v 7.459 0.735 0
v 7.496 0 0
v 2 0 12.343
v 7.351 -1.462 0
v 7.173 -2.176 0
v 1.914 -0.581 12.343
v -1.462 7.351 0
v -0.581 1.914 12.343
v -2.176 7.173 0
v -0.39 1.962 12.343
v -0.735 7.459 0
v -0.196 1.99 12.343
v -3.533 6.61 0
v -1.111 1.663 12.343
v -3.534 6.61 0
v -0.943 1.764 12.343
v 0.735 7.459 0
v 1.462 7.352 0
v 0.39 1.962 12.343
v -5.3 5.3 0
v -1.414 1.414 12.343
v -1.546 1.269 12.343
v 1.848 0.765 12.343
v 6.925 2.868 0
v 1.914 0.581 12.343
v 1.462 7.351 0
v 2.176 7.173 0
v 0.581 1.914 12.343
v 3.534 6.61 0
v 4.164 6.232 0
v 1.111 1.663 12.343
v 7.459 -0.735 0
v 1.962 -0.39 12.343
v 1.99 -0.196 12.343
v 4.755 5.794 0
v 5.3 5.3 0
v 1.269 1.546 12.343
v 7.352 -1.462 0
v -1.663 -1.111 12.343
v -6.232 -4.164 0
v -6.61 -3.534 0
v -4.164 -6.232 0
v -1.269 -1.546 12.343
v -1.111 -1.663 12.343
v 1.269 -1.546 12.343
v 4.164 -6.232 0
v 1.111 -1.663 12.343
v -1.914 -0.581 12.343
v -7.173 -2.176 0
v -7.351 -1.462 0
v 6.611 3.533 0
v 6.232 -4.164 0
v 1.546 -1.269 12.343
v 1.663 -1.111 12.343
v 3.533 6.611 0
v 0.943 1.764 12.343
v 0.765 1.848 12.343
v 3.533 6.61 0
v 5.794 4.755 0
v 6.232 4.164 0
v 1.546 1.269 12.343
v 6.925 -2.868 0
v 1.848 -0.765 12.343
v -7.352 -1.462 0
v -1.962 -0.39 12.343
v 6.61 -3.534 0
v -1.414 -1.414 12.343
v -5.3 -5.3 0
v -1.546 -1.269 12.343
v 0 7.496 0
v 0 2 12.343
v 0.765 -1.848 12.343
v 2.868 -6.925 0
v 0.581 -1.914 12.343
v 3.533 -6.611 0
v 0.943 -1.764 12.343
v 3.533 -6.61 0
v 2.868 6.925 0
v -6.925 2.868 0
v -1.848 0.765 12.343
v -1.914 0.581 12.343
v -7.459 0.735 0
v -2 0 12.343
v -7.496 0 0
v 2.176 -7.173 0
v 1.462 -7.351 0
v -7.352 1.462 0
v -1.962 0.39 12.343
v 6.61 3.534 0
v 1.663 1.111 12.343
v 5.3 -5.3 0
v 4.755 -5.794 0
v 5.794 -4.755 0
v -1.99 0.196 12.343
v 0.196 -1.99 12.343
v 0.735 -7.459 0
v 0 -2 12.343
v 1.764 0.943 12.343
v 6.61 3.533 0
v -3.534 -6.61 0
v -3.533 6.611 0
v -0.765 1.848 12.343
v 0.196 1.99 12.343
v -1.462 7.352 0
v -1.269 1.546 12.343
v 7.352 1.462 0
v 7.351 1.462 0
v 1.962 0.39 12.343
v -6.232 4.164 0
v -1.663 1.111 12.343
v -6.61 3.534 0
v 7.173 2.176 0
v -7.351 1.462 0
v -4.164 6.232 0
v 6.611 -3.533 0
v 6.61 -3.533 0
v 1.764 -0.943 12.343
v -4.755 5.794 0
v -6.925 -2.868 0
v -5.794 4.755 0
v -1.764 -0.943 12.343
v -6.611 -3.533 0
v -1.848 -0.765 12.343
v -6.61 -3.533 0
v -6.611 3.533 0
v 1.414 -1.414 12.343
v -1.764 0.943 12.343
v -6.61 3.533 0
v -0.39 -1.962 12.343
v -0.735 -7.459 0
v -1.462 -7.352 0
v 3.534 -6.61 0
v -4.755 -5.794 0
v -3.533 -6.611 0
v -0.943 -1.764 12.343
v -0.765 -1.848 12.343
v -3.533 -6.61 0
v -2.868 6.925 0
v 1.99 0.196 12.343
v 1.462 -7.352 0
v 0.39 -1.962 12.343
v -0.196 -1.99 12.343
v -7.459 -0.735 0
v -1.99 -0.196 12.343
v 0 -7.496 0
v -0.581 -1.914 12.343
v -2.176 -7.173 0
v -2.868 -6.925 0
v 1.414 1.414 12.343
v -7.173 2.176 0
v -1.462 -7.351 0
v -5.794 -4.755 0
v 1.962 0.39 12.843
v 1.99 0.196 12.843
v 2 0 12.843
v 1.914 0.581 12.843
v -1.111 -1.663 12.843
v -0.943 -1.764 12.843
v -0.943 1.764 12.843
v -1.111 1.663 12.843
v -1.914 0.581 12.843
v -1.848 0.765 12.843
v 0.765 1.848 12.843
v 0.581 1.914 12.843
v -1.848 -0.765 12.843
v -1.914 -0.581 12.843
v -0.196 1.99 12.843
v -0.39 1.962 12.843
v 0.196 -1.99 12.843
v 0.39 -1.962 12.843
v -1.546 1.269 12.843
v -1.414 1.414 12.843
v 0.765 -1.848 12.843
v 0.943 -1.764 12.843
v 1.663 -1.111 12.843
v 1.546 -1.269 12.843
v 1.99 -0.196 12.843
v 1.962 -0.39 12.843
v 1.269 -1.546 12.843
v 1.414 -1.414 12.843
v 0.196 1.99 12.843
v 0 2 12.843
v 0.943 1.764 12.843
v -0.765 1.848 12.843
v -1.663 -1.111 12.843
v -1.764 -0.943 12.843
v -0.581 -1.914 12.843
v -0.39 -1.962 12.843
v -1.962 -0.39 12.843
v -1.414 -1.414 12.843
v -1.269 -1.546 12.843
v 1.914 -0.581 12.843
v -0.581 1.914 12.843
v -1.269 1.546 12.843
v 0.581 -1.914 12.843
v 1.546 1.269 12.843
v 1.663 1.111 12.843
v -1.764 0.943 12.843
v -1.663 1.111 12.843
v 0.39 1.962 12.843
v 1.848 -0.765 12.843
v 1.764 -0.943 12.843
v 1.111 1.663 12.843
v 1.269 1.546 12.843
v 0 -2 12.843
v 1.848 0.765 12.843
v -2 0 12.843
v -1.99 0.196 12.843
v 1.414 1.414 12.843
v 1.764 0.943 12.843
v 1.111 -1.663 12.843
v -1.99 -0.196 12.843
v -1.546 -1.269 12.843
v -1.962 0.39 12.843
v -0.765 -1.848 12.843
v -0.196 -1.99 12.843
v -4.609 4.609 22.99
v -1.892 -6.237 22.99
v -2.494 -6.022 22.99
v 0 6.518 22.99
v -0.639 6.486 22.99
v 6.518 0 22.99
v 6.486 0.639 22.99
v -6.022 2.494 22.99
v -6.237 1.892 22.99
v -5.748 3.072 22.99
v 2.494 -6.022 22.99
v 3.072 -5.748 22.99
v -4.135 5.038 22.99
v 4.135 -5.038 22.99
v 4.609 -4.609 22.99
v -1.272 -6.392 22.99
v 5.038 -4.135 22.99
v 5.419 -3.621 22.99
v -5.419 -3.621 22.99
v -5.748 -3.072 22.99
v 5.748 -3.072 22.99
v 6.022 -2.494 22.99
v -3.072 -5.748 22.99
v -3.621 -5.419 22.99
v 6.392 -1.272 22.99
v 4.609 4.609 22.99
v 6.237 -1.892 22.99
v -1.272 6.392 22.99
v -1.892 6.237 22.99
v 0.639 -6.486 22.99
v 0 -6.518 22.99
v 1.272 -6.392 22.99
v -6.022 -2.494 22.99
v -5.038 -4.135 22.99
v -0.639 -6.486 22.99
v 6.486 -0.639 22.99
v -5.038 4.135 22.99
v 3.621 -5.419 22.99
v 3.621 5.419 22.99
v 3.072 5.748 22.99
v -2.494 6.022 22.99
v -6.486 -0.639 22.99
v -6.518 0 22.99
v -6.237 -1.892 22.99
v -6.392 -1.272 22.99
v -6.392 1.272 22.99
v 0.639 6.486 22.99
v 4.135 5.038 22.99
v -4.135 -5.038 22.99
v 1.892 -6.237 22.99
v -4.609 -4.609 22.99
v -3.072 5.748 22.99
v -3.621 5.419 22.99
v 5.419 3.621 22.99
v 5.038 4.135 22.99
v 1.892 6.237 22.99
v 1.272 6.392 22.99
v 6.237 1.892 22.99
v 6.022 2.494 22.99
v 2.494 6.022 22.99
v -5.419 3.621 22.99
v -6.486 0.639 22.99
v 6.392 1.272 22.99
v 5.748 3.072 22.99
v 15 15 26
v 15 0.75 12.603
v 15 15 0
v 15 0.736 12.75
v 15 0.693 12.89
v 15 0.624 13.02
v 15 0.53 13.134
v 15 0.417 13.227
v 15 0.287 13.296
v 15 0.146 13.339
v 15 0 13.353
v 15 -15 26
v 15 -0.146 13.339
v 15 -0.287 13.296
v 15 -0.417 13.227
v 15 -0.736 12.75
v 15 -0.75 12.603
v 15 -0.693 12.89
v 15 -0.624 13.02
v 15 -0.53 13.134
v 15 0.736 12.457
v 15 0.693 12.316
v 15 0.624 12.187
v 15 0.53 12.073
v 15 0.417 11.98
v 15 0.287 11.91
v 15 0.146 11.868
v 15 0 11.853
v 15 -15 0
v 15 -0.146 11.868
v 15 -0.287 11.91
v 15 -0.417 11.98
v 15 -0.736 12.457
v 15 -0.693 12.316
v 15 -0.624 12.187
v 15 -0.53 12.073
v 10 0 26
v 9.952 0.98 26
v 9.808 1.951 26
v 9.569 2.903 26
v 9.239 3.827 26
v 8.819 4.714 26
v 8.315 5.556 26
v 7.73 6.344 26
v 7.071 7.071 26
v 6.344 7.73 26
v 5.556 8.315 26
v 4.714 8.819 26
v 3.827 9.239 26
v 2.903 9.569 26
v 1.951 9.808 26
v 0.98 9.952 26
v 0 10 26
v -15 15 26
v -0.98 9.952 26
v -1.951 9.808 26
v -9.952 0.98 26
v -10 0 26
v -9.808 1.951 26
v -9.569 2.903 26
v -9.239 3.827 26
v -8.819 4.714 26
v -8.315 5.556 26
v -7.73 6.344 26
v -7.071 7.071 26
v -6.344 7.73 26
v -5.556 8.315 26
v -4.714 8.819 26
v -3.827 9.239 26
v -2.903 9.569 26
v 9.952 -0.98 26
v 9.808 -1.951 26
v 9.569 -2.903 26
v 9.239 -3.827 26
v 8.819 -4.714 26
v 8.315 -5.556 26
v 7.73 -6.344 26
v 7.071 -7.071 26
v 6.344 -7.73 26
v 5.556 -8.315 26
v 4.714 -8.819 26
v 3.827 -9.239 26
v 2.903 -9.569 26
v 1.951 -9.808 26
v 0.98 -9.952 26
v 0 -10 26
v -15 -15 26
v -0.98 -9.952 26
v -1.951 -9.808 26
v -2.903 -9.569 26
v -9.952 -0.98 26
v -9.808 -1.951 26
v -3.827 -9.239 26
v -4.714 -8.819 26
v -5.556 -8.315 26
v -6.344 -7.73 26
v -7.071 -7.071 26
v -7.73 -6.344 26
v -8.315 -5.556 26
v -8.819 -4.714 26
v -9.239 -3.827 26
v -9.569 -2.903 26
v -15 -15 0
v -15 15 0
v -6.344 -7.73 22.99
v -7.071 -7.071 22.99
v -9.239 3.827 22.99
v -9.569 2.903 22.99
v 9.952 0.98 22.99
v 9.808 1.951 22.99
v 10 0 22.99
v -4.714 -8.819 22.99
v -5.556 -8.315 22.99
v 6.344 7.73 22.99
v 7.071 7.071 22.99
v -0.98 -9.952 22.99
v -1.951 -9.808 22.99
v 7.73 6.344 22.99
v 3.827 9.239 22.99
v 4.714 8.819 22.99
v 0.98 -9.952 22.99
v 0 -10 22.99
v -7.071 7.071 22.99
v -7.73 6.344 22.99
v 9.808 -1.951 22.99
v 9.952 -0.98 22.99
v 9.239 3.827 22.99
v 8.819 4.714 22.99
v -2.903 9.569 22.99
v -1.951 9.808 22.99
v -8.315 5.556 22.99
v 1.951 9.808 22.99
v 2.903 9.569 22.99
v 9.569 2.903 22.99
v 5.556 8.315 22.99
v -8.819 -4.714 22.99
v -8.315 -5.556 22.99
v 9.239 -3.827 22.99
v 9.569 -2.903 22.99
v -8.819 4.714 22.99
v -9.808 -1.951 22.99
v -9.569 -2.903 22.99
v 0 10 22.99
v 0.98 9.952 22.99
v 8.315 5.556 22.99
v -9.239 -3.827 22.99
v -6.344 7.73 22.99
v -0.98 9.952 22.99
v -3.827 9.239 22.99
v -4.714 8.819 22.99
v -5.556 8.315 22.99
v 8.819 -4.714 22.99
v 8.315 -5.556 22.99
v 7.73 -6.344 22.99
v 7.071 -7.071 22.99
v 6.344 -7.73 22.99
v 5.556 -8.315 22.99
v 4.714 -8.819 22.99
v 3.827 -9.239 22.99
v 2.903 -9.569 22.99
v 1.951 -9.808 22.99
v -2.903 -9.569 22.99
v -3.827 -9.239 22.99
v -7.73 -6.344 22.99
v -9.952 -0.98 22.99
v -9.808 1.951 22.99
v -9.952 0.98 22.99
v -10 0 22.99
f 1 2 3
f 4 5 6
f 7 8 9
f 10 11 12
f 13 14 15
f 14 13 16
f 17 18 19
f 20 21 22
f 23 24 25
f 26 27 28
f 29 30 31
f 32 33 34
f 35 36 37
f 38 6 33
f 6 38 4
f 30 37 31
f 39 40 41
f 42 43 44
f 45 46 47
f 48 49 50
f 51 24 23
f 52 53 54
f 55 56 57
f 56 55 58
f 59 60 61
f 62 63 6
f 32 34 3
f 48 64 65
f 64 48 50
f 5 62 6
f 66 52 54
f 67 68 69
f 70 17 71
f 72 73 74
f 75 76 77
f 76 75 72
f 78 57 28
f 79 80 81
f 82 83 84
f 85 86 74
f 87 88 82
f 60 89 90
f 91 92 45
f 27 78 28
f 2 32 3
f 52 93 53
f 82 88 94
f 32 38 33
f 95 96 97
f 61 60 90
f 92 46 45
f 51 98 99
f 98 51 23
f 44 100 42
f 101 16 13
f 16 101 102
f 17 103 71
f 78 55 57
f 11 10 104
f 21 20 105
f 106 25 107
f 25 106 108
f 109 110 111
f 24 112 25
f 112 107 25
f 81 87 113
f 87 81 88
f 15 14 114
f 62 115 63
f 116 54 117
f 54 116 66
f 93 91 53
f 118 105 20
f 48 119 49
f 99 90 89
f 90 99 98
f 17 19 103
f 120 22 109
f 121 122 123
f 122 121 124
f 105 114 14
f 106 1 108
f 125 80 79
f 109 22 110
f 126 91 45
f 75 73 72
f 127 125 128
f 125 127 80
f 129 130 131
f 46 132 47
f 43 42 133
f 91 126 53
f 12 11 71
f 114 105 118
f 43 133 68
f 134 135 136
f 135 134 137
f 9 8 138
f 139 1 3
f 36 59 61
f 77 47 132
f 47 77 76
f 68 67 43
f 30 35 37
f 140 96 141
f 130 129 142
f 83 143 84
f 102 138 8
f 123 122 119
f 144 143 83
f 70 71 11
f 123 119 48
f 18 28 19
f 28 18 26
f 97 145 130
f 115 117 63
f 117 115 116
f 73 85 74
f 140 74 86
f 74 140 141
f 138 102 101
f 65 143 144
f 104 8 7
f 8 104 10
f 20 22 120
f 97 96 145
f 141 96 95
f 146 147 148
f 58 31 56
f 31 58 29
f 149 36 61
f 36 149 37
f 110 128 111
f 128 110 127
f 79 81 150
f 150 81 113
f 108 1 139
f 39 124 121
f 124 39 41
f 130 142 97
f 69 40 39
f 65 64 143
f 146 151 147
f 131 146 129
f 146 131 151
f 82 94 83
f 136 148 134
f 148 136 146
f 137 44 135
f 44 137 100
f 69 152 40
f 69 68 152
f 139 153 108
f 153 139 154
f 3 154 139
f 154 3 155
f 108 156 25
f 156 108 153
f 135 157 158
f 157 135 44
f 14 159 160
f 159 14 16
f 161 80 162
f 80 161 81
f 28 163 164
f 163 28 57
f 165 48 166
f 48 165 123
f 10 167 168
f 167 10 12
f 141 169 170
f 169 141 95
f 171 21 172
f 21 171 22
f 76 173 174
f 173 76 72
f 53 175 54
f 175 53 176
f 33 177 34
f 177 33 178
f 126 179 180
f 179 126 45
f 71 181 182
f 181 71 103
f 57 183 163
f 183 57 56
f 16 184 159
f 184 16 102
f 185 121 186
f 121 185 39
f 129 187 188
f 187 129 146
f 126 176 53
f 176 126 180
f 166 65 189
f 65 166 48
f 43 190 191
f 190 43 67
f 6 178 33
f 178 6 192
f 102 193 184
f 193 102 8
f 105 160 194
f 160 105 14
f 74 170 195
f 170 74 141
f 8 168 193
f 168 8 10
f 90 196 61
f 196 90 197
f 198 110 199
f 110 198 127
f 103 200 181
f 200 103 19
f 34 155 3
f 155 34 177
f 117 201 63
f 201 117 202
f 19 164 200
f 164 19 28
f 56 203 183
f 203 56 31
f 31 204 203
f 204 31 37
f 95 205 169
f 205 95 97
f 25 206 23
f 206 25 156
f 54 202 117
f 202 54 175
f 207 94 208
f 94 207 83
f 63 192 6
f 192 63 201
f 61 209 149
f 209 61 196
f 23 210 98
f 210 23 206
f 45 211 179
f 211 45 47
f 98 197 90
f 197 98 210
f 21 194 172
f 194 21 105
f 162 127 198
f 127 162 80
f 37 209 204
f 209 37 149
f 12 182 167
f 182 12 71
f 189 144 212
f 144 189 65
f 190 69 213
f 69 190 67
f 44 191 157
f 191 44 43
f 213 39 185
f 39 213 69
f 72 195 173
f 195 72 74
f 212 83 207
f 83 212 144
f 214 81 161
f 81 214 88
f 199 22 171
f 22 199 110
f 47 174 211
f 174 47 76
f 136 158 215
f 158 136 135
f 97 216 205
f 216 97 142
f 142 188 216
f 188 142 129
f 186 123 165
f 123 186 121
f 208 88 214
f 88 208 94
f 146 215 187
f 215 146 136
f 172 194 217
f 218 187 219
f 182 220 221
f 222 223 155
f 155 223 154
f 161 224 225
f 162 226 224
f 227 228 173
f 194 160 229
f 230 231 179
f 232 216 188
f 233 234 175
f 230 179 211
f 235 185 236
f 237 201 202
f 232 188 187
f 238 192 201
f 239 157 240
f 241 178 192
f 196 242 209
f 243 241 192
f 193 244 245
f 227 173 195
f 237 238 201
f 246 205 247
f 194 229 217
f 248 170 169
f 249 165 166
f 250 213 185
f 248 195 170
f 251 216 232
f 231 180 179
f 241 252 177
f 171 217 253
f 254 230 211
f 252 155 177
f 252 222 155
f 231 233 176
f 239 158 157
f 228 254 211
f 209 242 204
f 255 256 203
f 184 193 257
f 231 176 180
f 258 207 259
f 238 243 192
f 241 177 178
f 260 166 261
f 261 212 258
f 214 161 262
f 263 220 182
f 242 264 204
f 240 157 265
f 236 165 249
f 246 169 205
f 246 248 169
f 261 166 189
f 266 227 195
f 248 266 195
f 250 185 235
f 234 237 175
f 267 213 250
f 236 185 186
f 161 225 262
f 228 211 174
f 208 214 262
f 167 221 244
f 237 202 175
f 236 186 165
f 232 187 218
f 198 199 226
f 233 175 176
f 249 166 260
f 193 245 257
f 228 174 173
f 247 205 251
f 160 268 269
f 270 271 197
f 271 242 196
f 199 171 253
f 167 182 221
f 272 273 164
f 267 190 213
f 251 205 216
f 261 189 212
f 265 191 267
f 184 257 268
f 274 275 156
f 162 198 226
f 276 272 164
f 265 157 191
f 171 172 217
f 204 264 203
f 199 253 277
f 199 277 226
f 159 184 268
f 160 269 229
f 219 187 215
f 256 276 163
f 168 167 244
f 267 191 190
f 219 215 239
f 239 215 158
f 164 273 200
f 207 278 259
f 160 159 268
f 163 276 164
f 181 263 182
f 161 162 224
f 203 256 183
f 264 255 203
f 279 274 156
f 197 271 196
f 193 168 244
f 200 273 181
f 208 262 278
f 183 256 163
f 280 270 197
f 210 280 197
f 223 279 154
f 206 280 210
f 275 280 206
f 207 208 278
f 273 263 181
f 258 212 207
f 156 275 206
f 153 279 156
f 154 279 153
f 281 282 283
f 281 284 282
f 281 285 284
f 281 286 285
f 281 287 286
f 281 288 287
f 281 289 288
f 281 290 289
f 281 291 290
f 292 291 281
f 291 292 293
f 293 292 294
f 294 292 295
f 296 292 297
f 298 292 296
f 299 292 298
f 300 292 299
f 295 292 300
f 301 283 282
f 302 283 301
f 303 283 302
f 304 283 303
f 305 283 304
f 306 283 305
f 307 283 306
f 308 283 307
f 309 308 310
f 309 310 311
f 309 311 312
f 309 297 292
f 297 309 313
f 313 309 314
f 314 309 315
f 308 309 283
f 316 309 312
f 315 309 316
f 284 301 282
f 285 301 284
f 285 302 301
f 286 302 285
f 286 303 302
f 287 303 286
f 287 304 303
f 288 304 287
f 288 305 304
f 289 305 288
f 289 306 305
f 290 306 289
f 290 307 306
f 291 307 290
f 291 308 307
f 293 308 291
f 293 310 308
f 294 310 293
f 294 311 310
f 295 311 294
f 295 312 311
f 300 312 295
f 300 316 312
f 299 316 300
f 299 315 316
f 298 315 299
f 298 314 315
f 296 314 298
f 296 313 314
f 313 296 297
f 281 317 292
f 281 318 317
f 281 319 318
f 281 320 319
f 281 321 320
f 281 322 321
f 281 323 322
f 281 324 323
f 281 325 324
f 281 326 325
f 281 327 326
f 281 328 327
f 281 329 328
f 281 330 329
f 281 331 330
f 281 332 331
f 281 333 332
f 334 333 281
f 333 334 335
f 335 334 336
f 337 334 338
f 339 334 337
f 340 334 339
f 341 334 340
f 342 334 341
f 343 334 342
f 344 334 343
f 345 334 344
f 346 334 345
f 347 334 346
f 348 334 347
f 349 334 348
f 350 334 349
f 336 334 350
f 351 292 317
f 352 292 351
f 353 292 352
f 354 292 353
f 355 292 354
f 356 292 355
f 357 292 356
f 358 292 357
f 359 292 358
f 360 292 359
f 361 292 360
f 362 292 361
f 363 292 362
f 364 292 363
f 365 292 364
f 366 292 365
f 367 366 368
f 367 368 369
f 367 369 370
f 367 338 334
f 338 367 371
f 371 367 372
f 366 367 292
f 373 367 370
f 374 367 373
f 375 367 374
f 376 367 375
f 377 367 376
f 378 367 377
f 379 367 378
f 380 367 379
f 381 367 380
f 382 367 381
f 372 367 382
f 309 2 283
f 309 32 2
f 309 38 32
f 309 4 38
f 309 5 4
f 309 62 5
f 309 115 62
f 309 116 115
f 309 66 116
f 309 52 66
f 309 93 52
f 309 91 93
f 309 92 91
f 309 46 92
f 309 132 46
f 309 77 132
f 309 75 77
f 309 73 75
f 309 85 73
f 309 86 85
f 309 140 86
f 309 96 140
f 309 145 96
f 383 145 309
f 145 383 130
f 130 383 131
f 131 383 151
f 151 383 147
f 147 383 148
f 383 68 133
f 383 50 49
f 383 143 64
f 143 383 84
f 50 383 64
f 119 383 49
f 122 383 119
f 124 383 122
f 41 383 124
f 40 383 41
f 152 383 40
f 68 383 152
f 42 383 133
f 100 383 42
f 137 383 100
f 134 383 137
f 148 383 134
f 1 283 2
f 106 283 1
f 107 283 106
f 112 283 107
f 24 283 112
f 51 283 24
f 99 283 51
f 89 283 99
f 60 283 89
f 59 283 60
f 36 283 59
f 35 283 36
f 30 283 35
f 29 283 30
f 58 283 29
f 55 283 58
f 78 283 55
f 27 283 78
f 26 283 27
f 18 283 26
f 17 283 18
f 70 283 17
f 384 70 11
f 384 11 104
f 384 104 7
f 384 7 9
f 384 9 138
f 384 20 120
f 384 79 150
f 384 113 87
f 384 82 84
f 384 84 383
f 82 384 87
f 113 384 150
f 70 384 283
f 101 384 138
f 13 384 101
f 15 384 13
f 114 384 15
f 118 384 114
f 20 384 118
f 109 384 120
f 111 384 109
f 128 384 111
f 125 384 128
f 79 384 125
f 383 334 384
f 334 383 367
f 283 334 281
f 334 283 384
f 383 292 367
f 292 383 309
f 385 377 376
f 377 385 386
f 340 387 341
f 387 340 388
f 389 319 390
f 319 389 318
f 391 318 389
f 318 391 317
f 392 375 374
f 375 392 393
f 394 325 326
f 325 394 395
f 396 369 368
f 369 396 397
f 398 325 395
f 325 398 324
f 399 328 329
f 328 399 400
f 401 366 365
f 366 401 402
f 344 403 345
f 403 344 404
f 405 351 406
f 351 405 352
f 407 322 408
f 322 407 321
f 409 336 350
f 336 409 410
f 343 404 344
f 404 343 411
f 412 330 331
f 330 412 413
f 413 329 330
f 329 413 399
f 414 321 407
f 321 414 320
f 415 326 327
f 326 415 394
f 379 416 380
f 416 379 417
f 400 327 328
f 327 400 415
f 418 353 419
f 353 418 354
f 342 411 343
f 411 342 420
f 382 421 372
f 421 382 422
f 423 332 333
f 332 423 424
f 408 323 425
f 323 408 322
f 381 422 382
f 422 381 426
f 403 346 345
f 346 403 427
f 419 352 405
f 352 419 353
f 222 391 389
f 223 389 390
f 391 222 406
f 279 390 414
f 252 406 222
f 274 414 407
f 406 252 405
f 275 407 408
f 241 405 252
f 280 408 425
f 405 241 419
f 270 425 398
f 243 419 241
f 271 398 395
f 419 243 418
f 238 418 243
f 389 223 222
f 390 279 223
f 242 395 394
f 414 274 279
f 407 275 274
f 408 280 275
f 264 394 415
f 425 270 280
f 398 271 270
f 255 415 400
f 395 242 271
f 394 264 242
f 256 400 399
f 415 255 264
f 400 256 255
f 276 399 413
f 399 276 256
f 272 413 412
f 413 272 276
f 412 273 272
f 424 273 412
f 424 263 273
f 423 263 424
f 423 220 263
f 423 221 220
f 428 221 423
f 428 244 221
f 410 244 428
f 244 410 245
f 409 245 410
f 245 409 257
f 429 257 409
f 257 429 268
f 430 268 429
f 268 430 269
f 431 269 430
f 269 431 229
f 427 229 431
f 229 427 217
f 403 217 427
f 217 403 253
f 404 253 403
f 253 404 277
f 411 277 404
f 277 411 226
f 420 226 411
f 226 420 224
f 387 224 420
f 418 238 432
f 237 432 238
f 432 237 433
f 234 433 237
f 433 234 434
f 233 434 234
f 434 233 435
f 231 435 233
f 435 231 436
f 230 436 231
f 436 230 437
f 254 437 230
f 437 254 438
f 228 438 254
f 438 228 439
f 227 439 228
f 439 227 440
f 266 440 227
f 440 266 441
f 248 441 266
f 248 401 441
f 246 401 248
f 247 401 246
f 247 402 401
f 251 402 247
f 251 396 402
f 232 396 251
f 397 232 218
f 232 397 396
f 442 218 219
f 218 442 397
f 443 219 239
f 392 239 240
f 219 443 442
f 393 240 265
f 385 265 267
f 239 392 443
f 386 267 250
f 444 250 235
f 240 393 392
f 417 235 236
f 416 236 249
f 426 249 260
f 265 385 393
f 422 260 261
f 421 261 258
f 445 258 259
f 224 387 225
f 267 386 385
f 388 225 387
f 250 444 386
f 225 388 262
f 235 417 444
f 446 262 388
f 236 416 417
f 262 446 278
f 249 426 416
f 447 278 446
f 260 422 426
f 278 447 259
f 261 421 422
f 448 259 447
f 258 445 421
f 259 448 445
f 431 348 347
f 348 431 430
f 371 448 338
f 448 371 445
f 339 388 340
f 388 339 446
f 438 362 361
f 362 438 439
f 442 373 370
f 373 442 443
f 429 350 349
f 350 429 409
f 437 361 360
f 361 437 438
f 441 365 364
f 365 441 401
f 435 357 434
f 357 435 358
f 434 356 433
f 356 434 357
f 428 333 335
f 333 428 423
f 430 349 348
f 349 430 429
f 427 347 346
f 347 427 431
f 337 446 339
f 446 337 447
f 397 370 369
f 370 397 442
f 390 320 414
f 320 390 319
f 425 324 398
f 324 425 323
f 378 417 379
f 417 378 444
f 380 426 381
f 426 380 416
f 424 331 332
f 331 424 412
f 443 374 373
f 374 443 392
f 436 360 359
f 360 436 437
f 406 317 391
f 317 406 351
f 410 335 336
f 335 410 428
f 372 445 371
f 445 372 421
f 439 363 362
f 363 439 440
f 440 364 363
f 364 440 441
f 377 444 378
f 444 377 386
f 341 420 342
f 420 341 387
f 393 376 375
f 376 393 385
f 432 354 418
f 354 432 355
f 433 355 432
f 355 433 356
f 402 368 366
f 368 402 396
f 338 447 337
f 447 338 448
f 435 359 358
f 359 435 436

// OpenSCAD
// AeroCool Throat Test V2 — Venturi Atomization Verification
// Print: Funnel vertical, no supports, PETG, 0.2mm layer, 15-20% infill
// Estimated print time: ~30 min, ~10g PETG
//
// PURPOSE: Validate that the 4mm throat self-aspirates water and atomizes it
// when air flows through the Venturi. If this test works, the atomization concept
// is validated.

// ============================================================
// USER ADJUSTABLE PARAMETERS
// ============================================================

BLOCK_SIZE = 30;          // mm square
BLOCK_HEIGHT = 26;        // mm total height

INLET_D = 15;             // Inlet diameter (mm)
THROAT_D = 4;             // Throat diameter (mm) — increased from 2.5mm
THROAT_LEN = 0.5;         // Straight throat length (mm)
CONE_ANGLE = 24;          // Half-angle from axis (degrees)

CHAMBER_R = 10;           // Expansion chamber radius (mm)
CHAMBER_DEPTH = 3;        // Expansion chamber depth (mm)

WATER_CHANNEL_D = 1.5;    // Water channel bore diameter (mm)
WATER_CHANNEL_OFFSET = 0; // Y offset for water channel (mm, 0 = center)

// ============================================================
// DERIVED PARAMETERS (do not modify)
// ============================================================

r_in = INLET_D / 2;
r_th = THROAT_D / 2;

// Calculate converging and diverging lengths from angle
converge_len = (r_in - r_th) / tan(CONE_ANGLE);

// The funnel must fit in the block. The diverging section determines the outlet size.
// We set the funnel depth to reach the chamber floor.
funnel_depth = BLOCK_HEIGHT - CHAMBER_DEPTH;

// Calculate outlet radius from available diverging length
diverge_len = funnel_depth - converge_len - THROAT_LEN;
r_out = r_th + diverge_len * tan(CONE_ANGLE);
OUTLET_D = 2 * r_out;

chamber_z = funnel_depth;           // Chamber starts at funnel outlet
throat_z = converge_len + THROAT_LEN / 2;  // Center of throat
water_channel_len = BLOCK_SIZE / 2 + r_th + 0.5; // From side wall through throat

// ============================================================
// GEOMETRY VERIFICATION REPORT
// ============================================================

echo(str("=== Throat Test V2 Geometry ==="));
echo(str("Block size: ", BLOCK_SIZE, " x ", BLOCK_SIZE, " x ", BLOCK_HEIGHT, " mm"));
echo(str("Funnel depth: ", funnel_depth, " mm"));
echo(str("Converging section: ", converge_len, " mm"));
echo(str("Throat section: ", THROAT_LEN, " mm"));
echo(str("Diverging section: ", diverge_len, " mm"));
echo(str("Outlet diameter: ", OUTLET_D, " mm"));
echo(str("Throat diameter: ", THROAT_D, " mm (", THROAT_D / 0.4, " nozzle widths for 0.4mm nozzle)"));
echo(str("Throat center Z: ", throat_z, " mm"));
echo(str("Chamber starts at Z: ", chamber_z, " mm"));
echo(str("Inlet/throat area ratio: ", pow(INLET_D / THROAT_D, 2), ":1"));
echo(str("Outlet/throat area ratio: ", pow(OUTLET_D / THROAT_D, 2), ":1"));
echo(str("Water channel: ", WATER_CHANNEL_D, " mm from side wall, through throat"));

// ============================================================
// MODULES
// ============================================================

module venturi_funnel() {
    cylinder(h = converge_len, r1 = r_in, r2 = r_th, $fn = 64);
    translate([0, 0, converge_len])
        cylinder(h = THROAT_LEN, r = r_th, $fn = 64);
    translate([0, 0, converge_len + THROAT_LEN])
        cylinder(h = diverge_len, r1 = r_th, r2 = r_out, $fn = 64);
}

// ============================================================
// MAIN ASSEMBLY
// ============================================================

difference() {
    // Solid block
    translate([-BLOCK_SIZE/2, -BLOCK_SIZE/2, 0])
        cube([BLOCK_SIZE, BLOCK_SIZE, BLOCK_HEIGHT]);
    
    // Venturi funnel through-hole
    translate([0, 0, -0.01])
        venturi_funnel();
    
    // Expansion chamber on top (outlet side)
    translate([0, 0, chamber_z - 0.01])
        cylinder(h = CHAMBER_DEPTH + 0.02, r = CHAMBER_R, $fn = 64);
    
    // Water injection channel: horizontal bore from side wall into throat
    // Enter from +X side, go through throat center
    translate([BLOCK_SIZE/2, WATER_CHANNEL_OFFSET, throat_z])
        rotate([0, 90, 0])
            cylinder(h = water_channel_len + 0.02, d = WATER_CHANNEL_D, $fn = 32);
}

// ============================================================
// TEST PROTOCOL
// ============================================================
// 1. Print with PETG, 0.2mm layer, no supports, brim recommended
// 2. Inspect throat with a light: should be round and open
// 3. Hold a small syringe or cup of water against the side channel inlet
// 4. Blow air through the funnel (or use a fan / compressed air)
// 5. Observe: does water level drop? (suction confirmed)
// 6. Feel outlet air: is it moist? (atomization confirmed)
// 7. Optional: measure outlet temperature with thermocouple (cooling confirmed)
//
// PASS CRITERIA:
// - Water level drops when air flows (suction works)
// - Outlet air feels moist (atomization works)
// - Temperature drop > 5°C with water (cooling works)
//
// FAIL CRITERIA:
// - Throat clogged or severely rough (increase THROAT_D to 5)
// - No water aspiration (check channel alignment, increase channel diameter)
// ============================================================
